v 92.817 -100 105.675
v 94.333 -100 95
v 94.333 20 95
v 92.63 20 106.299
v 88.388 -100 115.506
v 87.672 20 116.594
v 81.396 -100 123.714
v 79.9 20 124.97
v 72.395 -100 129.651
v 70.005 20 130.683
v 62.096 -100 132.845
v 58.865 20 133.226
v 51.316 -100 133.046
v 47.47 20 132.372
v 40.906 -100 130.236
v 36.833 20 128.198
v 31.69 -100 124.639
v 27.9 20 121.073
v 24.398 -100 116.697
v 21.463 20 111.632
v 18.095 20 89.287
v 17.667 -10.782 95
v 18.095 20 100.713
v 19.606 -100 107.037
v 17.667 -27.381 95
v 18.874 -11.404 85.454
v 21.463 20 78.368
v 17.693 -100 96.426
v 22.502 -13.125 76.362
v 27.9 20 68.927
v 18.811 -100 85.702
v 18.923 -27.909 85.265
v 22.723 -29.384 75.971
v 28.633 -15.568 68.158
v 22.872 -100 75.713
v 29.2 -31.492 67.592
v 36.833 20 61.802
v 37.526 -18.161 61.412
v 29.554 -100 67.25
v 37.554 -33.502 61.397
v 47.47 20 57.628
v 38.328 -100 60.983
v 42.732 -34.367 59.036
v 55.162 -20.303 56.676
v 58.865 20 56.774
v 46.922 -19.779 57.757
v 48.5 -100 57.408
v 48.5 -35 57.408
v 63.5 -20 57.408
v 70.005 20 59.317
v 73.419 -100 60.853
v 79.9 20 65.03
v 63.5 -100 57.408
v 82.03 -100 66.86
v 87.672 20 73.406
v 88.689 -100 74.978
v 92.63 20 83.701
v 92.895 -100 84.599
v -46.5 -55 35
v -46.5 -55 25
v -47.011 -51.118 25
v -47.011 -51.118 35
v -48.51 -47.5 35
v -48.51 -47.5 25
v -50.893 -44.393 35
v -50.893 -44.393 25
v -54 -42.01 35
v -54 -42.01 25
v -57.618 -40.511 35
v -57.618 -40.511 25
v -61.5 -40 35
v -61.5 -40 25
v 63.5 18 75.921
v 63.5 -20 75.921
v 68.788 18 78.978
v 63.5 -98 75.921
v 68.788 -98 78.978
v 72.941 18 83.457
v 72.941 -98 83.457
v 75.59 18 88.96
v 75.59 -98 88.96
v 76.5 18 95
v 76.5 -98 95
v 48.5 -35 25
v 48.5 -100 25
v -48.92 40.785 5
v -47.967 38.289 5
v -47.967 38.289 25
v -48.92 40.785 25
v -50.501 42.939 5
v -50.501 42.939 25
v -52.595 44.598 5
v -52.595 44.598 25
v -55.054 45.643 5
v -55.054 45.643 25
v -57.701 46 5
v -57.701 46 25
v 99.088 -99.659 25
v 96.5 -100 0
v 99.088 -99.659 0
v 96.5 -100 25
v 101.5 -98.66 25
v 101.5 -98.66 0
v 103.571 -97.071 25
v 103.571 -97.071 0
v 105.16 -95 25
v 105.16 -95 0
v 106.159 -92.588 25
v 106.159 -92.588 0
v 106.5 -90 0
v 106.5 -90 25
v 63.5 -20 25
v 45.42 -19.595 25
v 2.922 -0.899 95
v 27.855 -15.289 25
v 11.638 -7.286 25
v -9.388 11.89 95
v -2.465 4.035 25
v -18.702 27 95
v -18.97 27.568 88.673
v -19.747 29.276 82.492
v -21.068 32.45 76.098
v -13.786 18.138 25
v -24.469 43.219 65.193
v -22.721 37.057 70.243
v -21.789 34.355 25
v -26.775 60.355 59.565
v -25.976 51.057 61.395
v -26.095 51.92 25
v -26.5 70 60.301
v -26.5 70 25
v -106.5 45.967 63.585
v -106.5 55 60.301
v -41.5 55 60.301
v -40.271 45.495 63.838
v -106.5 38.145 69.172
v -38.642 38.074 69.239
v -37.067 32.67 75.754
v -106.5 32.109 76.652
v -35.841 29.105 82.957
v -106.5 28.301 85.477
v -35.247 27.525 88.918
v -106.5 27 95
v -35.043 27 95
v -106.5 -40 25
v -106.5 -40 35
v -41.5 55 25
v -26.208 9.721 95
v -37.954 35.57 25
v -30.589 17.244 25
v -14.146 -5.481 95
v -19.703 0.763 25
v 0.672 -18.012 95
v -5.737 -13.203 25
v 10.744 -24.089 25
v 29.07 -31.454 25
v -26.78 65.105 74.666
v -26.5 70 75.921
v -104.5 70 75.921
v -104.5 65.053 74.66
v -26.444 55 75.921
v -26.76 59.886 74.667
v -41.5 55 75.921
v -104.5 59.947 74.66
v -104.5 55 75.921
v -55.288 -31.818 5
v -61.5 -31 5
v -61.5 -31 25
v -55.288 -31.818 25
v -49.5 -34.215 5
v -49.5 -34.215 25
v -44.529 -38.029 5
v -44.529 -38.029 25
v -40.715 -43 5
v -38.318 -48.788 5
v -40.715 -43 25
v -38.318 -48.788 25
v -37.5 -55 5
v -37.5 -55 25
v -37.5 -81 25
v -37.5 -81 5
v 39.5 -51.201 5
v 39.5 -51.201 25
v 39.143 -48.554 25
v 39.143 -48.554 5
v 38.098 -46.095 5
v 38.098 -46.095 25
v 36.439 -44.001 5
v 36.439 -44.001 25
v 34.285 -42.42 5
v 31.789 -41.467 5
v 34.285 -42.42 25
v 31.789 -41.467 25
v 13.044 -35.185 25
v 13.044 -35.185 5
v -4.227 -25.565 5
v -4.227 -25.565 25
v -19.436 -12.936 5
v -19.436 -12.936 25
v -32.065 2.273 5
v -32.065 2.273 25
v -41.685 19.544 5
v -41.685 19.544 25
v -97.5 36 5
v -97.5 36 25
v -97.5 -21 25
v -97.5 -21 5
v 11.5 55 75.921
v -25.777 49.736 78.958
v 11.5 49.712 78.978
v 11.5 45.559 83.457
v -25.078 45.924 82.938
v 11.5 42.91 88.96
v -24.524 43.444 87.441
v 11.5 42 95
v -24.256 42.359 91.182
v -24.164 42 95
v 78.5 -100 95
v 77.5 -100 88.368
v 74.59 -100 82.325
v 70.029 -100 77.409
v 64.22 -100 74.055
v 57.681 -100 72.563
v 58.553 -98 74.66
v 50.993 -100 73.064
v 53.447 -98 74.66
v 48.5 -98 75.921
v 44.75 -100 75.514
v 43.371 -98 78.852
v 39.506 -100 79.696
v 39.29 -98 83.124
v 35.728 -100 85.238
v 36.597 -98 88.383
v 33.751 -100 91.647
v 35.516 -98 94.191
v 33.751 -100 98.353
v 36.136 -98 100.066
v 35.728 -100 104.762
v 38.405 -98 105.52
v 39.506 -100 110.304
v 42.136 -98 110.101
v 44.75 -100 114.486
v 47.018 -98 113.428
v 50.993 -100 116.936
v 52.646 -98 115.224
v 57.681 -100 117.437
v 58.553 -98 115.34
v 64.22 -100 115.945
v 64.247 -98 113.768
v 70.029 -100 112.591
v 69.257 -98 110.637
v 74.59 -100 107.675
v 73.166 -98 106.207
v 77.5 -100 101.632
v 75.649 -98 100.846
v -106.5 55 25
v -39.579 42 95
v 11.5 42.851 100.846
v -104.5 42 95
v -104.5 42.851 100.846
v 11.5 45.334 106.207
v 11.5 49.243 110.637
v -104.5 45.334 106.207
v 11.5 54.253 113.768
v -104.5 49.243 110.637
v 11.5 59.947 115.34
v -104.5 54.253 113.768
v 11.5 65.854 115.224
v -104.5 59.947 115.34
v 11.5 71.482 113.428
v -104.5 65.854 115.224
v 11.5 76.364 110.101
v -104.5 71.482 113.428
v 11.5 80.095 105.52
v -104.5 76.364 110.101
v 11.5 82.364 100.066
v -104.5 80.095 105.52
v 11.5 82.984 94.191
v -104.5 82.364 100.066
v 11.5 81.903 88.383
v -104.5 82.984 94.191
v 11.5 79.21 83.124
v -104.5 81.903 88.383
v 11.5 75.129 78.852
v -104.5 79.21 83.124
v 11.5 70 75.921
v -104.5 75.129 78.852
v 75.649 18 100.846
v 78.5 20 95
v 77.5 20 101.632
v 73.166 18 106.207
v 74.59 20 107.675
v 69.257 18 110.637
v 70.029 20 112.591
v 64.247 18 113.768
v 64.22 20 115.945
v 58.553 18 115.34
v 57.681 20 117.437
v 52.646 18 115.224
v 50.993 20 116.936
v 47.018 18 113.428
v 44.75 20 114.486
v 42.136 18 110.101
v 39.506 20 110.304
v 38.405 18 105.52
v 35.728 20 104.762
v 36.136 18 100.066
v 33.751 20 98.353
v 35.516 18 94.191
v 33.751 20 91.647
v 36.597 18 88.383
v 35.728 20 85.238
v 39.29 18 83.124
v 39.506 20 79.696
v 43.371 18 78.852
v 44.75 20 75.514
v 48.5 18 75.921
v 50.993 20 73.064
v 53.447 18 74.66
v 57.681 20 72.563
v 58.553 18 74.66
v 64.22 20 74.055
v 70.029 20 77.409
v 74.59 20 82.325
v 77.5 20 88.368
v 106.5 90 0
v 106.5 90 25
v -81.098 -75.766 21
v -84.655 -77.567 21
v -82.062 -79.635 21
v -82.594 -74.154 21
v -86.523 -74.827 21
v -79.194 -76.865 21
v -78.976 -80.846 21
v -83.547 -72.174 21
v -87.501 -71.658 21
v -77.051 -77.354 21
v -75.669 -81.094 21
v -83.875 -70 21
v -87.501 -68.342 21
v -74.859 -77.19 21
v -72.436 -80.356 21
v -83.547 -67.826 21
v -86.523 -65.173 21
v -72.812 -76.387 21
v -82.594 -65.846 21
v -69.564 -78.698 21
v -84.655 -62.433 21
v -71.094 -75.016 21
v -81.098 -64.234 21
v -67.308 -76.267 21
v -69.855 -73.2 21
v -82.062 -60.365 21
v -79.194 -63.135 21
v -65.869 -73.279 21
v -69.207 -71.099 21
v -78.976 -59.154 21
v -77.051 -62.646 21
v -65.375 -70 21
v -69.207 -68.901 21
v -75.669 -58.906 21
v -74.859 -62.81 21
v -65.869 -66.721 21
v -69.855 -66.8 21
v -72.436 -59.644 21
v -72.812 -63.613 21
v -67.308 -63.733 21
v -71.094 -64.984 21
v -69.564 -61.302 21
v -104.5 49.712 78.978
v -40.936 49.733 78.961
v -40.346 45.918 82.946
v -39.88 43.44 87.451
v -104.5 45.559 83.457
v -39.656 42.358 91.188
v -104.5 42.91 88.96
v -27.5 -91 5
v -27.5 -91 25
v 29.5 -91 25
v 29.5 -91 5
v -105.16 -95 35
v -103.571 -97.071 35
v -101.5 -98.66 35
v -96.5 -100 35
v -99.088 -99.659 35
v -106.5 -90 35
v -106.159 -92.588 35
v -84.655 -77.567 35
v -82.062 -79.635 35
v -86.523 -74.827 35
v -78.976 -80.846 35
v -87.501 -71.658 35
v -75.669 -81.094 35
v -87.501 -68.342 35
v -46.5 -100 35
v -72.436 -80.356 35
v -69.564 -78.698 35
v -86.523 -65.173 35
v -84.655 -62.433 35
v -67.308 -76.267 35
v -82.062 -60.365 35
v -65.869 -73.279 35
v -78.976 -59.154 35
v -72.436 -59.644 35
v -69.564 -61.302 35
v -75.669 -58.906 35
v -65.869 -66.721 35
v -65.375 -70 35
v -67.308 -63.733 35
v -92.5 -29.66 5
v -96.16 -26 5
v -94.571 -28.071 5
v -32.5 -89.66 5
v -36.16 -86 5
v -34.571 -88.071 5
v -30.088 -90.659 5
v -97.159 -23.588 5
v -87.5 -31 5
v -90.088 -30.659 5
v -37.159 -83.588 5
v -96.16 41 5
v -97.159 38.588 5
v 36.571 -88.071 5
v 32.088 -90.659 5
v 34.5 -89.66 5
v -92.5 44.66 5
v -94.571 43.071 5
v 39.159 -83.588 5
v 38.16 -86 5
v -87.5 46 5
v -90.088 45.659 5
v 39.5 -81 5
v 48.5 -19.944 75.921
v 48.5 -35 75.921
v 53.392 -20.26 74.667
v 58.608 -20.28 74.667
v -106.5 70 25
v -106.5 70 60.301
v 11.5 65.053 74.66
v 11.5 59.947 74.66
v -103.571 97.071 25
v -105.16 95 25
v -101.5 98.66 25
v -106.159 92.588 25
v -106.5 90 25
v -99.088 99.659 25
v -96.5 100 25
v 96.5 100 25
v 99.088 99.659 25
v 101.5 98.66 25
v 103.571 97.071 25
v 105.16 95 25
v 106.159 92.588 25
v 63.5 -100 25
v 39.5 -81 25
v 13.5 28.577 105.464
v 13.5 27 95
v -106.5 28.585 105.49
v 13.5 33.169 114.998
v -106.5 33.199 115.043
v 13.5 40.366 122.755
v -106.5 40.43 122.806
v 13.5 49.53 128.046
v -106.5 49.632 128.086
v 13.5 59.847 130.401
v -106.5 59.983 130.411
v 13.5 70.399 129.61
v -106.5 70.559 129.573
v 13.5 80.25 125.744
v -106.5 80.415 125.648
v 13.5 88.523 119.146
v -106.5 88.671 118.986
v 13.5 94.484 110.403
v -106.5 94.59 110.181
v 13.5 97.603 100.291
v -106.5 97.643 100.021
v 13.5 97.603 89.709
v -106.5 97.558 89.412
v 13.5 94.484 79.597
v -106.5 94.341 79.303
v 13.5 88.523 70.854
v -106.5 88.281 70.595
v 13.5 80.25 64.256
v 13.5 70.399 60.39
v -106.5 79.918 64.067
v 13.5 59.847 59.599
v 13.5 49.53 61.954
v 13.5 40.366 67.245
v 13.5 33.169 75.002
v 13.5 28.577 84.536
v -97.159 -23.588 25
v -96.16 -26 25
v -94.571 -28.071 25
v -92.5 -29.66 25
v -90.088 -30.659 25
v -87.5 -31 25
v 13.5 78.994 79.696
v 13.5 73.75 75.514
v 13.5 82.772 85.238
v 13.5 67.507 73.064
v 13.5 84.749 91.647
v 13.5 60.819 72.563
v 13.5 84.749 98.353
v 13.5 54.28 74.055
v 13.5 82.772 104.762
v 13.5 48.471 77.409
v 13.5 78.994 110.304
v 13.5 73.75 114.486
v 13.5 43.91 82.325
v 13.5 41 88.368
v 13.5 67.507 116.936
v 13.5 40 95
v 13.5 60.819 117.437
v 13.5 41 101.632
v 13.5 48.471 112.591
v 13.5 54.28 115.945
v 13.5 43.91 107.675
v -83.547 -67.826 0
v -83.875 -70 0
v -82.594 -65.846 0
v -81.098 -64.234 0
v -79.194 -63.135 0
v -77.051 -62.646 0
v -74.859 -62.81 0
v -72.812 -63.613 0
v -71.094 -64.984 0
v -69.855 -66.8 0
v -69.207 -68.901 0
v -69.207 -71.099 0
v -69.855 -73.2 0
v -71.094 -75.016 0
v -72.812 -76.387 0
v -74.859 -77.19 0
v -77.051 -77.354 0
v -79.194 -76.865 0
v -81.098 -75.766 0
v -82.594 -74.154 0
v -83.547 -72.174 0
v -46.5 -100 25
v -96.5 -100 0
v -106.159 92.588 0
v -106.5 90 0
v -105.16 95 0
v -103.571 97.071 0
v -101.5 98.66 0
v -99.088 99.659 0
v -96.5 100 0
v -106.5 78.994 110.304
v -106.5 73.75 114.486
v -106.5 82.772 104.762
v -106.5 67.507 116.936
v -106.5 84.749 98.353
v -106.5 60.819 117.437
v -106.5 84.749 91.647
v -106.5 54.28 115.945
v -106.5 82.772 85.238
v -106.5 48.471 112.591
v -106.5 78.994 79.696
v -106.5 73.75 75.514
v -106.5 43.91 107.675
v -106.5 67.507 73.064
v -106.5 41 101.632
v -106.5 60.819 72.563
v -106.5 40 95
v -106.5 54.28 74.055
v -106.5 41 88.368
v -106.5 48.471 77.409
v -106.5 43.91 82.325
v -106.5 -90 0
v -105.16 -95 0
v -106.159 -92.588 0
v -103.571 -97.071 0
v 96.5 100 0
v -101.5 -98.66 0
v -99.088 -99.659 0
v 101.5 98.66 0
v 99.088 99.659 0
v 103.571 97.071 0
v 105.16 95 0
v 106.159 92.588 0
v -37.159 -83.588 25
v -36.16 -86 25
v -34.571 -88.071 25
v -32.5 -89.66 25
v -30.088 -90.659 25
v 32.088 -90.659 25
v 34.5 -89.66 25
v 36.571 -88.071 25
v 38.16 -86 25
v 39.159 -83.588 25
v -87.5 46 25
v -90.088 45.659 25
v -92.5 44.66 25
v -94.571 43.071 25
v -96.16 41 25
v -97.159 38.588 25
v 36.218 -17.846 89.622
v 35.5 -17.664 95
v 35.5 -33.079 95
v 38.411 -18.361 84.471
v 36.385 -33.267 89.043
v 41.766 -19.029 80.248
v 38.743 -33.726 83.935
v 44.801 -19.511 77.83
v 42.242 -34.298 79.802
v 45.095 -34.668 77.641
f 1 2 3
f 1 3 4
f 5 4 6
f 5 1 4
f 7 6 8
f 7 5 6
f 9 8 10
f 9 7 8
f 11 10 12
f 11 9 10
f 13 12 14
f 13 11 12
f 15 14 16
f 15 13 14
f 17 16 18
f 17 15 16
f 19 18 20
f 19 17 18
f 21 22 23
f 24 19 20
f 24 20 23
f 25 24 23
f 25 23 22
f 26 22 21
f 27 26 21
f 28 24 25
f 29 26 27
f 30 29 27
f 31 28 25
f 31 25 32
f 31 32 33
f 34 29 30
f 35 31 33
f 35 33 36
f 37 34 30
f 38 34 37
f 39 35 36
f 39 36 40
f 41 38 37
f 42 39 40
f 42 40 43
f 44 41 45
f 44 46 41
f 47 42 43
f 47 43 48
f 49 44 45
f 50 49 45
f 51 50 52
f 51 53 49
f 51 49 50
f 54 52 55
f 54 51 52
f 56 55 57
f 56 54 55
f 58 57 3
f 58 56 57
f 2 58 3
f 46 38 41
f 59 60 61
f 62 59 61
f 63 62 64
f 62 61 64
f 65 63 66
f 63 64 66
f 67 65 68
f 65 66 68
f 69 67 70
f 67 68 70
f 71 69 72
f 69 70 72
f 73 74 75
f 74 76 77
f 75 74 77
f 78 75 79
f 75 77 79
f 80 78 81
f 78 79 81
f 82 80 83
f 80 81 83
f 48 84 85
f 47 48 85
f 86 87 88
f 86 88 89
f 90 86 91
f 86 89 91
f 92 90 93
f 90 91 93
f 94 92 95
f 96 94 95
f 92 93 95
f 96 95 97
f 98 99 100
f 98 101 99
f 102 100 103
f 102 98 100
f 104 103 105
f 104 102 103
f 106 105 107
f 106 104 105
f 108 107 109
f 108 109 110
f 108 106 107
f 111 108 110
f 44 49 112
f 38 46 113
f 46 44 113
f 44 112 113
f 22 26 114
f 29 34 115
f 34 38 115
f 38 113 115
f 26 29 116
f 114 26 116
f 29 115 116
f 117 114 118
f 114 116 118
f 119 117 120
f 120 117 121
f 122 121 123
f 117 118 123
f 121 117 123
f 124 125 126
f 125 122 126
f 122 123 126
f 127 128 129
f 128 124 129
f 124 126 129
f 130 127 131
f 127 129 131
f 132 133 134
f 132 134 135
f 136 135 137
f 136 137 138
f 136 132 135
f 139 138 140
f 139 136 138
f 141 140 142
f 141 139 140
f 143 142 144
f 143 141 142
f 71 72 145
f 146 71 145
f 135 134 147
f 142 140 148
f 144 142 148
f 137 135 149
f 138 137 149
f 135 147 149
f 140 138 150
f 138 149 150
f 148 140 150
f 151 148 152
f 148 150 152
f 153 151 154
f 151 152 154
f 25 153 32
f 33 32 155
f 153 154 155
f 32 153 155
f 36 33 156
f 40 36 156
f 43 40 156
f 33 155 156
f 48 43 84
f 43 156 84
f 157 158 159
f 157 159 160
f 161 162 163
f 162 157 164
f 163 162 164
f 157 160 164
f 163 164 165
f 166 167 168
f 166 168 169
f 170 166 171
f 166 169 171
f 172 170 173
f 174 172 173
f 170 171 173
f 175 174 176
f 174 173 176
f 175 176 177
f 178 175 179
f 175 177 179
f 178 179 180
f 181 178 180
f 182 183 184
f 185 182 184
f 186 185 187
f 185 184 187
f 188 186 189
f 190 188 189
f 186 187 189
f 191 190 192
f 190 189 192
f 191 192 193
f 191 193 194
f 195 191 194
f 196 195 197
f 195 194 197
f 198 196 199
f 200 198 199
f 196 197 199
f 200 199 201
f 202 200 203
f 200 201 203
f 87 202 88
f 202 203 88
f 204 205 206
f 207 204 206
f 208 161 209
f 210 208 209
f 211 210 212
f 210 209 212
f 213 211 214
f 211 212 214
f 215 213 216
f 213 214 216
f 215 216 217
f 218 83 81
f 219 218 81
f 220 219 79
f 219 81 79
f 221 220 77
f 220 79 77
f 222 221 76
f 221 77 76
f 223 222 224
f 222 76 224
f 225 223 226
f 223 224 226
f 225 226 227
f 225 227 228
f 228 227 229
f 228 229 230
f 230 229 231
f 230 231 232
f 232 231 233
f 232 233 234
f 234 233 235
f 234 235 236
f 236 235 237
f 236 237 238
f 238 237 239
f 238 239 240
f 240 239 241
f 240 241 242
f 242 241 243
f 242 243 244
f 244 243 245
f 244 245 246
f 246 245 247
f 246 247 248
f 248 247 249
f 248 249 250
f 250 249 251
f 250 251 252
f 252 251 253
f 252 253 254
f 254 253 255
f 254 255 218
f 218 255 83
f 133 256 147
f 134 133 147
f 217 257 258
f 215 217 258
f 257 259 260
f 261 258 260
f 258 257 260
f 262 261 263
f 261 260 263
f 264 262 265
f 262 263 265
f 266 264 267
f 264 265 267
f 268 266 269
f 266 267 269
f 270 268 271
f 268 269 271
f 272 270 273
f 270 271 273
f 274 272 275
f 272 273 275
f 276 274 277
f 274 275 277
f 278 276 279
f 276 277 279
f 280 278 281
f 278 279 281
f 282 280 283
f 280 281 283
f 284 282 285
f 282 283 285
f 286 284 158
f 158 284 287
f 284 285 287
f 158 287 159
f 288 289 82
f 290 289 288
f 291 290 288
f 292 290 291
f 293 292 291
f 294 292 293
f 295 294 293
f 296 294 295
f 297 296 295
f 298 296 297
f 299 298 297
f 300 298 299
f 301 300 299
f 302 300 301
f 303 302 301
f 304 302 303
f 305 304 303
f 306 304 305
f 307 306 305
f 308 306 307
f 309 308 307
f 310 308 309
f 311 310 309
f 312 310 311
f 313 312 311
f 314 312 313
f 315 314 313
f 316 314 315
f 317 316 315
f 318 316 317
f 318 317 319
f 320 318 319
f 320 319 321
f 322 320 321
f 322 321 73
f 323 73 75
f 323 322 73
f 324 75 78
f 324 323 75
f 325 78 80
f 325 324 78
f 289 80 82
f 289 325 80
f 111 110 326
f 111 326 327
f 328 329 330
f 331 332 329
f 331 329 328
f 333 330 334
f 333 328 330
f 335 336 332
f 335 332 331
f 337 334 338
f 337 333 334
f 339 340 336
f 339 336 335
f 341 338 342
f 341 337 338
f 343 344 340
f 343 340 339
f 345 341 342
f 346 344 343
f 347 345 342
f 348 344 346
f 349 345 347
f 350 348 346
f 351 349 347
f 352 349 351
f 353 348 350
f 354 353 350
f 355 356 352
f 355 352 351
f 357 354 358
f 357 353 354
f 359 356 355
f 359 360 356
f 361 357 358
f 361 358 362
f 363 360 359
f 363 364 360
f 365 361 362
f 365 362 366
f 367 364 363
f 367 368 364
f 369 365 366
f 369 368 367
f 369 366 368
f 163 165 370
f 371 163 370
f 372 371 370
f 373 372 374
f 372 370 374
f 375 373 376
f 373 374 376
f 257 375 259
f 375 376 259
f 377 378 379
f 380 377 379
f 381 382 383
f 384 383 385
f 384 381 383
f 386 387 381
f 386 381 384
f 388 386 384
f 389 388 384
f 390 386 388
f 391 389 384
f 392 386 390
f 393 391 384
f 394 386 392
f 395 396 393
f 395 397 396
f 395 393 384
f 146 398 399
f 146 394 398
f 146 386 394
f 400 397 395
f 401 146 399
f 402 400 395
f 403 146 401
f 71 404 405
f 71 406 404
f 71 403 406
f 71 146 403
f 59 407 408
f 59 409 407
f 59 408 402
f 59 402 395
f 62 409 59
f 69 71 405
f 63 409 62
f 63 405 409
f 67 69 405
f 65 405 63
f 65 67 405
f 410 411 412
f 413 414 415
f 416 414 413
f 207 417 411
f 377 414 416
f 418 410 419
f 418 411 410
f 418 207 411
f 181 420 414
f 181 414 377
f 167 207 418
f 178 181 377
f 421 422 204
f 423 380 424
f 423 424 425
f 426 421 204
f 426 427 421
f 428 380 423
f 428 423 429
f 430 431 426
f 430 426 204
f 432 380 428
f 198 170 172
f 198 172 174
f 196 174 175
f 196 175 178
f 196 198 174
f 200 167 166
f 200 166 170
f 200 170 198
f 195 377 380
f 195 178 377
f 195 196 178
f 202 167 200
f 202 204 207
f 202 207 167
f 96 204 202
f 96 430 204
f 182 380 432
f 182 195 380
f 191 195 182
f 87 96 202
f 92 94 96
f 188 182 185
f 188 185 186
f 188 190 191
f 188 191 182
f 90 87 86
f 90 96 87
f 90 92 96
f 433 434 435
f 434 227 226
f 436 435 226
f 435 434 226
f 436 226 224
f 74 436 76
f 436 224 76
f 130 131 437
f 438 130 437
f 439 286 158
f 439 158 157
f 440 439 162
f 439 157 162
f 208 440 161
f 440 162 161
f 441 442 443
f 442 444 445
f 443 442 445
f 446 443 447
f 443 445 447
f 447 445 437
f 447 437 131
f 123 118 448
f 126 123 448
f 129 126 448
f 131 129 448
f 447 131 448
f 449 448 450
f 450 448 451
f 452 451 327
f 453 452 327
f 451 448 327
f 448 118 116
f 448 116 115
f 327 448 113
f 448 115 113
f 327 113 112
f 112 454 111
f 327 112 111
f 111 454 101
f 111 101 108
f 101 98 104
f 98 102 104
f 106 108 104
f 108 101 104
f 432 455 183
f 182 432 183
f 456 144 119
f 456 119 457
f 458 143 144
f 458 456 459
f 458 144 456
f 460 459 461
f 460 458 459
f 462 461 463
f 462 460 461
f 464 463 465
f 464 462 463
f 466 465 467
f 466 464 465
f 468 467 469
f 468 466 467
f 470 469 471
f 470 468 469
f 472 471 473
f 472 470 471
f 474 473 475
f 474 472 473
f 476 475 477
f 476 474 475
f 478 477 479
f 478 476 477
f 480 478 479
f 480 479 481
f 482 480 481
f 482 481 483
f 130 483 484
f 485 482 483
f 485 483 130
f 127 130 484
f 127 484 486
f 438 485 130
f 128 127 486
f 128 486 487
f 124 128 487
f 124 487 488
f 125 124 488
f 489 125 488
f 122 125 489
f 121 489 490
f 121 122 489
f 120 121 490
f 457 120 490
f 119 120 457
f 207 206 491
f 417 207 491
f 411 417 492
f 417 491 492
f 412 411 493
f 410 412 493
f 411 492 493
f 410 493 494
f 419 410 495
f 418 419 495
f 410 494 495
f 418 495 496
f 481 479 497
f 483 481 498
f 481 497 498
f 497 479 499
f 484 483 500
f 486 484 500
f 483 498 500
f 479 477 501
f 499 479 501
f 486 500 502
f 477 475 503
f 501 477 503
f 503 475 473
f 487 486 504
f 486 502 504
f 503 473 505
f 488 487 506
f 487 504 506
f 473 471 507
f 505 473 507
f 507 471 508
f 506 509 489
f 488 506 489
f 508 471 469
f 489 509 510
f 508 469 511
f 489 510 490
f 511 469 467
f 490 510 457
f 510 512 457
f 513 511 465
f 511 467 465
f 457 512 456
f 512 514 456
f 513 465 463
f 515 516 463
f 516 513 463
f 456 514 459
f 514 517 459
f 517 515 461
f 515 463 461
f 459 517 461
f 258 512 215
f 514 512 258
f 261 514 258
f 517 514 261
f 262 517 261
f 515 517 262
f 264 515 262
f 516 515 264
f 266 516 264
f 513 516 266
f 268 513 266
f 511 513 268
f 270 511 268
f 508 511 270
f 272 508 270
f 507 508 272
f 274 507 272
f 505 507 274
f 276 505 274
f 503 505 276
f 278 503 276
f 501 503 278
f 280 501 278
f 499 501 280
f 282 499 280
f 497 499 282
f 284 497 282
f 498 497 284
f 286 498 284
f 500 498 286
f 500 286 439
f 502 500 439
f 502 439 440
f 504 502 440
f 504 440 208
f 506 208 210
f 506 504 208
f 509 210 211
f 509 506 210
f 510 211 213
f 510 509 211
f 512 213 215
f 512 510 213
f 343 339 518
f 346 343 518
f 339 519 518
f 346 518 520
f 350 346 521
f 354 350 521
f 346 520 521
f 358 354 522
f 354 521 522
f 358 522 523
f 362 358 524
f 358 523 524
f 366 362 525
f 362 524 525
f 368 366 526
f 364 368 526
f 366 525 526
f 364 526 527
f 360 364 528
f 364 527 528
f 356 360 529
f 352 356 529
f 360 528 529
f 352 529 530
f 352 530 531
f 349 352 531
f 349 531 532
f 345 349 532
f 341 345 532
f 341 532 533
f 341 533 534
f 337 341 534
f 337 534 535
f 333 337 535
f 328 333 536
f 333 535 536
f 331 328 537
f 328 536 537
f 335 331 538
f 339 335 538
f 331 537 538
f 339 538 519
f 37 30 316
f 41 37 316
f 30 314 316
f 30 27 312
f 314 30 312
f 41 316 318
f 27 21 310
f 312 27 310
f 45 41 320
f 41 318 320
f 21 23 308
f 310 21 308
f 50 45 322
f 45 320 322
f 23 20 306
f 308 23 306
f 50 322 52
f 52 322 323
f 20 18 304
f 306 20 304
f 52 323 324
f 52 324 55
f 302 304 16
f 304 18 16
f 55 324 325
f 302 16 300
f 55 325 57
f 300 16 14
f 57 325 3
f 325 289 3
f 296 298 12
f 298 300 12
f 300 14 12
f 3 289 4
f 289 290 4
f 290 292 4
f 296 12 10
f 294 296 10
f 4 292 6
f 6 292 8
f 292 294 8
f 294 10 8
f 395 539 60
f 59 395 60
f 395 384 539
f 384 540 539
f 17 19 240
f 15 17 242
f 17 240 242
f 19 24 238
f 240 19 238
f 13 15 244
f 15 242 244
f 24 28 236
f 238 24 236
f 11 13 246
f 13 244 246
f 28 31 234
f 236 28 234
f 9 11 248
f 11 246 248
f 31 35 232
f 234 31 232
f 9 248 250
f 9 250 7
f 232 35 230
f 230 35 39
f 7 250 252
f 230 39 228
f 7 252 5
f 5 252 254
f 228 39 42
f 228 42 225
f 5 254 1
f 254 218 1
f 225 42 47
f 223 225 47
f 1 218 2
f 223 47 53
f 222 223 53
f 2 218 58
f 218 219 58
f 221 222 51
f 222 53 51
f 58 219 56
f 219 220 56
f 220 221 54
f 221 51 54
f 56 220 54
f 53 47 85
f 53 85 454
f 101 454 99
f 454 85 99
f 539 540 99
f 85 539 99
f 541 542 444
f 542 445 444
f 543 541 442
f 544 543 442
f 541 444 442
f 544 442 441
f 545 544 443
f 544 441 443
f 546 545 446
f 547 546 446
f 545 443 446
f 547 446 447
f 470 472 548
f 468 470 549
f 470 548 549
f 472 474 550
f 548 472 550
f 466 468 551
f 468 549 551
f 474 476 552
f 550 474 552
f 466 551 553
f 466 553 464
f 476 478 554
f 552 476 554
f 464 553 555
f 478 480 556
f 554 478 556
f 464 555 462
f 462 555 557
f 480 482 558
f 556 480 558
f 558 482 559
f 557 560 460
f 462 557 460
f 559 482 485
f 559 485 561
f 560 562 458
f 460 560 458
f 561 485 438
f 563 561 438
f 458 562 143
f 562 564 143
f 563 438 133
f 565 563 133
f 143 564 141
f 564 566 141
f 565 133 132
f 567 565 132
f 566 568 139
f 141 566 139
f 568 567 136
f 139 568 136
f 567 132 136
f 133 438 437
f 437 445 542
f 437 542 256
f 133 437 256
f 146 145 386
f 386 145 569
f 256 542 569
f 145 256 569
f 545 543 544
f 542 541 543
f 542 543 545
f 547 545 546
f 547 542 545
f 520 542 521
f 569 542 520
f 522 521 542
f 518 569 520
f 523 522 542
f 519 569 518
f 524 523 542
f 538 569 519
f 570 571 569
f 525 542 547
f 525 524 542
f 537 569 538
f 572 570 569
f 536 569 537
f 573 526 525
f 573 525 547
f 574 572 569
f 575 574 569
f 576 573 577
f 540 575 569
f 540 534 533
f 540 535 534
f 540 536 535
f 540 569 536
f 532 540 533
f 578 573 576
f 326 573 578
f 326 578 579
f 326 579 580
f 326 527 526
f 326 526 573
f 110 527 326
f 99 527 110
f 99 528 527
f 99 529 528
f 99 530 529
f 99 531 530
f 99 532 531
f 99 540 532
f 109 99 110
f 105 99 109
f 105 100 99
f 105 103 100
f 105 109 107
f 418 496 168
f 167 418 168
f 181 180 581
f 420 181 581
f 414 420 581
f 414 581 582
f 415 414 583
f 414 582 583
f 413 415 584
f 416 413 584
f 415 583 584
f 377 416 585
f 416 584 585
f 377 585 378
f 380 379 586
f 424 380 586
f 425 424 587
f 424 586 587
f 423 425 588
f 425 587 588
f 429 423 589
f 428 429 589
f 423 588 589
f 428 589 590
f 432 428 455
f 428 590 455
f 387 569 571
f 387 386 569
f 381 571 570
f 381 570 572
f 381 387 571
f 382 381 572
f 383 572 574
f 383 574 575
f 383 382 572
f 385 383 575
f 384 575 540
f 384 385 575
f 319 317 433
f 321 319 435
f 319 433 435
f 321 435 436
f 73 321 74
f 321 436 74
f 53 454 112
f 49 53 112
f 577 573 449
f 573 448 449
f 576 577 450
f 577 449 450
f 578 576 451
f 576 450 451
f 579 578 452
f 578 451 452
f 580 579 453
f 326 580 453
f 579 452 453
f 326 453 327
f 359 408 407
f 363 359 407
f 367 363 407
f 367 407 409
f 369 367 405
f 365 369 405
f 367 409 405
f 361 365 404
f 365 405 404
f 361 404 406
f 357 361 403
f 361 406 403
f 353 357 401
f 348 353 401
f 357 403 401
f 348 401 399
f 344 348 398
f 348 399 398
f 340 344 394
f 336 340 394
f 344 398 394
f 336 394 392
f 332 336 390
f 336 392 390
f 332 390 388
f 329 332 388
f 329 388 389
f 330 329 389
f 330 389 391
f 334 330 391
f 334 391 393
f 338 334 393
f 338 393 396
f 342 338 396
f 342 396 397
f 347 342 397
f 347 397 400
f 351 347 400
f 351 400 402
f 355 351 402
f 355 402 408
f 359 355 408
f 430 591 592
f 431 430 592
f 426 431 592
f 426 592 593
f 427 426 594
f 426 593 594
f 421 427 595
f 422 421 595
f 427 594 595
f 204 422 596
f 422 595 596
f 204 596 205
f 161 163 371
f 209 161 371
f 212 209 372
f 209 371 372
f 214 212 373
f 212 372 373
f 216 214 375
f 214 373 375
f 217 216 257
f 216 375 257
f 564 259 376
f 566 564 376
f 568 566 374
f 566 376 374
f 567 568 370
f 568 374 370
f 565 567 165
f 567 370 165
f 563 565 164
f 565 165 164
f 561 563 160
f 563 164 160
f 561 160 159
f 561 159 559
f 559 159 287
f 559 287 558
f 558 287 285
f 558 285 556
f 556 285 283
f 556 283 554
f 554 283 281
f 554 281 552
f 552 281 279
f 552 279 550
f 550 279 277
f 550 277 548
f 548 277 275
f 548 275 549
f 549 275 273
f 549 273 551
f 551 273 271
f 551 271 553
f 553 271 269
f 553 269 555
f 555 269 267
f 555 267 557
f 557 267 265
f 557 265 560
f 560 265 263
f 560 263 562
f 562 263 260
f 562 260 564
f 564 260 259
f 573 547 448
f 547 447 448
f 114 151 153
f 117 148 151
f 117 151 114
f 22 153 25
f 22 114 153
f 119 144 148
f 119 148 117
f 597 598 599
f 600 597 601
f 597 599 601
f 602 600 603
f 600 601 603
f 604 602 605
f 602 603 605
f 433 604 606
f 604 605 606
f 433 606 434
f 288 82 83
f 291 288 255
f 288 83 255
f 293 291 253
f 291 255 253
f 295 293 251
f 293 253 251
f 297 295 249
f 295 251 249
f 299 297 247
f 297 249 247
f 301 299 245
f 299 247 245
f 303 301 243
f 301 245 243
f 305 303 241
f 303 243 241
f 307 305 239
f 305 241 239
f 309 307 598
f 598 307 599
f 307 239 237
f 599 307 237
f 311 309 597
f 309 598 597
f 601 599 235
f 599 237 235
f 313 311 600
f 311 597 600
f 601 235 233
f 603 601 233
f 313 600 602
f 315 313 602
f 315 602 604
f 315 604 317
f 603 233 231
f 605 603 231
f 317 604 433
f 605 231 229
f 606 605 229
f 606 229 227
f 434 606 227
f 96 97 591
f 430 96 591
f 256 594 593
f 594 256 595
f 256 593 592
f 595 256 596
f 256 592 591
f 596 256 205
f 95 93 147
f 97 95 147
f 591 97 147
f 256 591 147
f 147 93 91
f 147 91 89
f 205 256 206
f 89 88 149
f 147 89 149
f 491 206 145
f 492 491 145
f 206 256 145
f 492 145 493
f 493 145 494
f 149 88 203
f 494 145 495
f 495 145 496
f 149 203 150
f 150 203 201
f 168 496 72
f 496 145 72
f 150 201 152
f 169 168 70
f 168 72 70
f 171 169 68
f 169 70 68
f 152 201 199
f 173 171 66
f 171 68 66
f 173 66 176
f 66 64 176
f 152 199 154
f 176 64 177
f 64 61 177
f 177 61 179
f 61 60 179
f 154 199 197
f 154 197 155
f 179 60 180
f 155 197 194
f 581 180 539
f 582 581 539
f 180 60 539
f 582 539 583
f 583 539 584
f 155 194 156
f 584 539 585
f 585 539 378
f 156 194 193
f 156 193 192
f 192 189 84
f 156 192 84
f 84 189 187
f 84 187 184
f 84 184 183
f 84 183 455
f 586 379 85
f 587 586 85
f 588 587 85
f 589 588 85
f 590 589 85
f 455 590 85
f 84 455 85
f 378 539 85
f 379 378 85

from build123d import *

# Parameters (mm, degrees)
F0_W            = 213
F0_H            = 25
F1_DEPTH        = 100
F3_DEPTH        = 20
F4_DEPTH        = 70
F5_R            = 38.333333335
F5_R_2          = 20.5
F6_DEPTH        = 120
F7_R            = 35.5
F7_R_2          = 20.5
F8_DEPTH        = 120
F9_DEPTH        = 213.001
F10_DEPTH       = 200.001
F11_DEPTH       = 10
F13_D           = 14.75
F13_CBORE_D     = 22.25
F13_CBORE_DEPTH = 14
F14_R           = 10


# Not quite as in the source:
# - a fillet or chamfer that OpenCascade refuses, or shapes differently, is made with other operations: its cross-section is extruded or revolved along the edge and cut away or added


with BuildPart() as f1:
    # F0 (on Front) → F1 (new body, symmetric)
    with BuildSketch(Plane.XZ):
        with Locations((0, 12.5)):
            Rectangle(F0_W, F0_H)
    extrude(amount=F1_DEPTH, both=True)

    # F2 (on face) → F3 (cut)
    with BuildSketch(Plane.XY.offset(25)):
        with BuildLine():
            ThreePointArc((-97.5, -21), (-94.5710678119, -28.0710678119), (-87.5, -31))
            Line((-87.5, -31), (-61.5, -31))
            ThreePointArc((-61.5, -31), (-44.5294372515, -38.0294372515), (-37.5, -55))
            Line((-37.5, -55), (-37.5, -81))
            ThreePointArc((-37.5, -81), (-34.5710678119, -88.0710678119), (-27.5, -91))
            Line((-27.5, -91), (29.5, -91))
            ThreePointArc((29.5, -91), (36.5710678119, -88.0710678119), (39.5, -81))
            Line((39.5, -81), (39.5, -51.2013330404))
            ThreePointArc((39.5, -51.2013330404), (37.338740663, -44.9921346366), (31.7891710363, -41.4668738378))
            ThreePointArc((31.7891710363, -41.4668738378), (-19.4358675785, -12.9358675785), (-47.9668738378, 38.2891710363))
            ThreePointArc((-47.9668738378, 38.2891710363), (-51.4921346366, 43.838740663), (-57.7013330404, 46))
            Line((-57.7013330404, 46), (-87.5, 46))
            ThreePointArc((-87.5, 46), (-94.5710678119, 43.0710678119), (-97.5, 36))
            Line((-97.5, 36), (-97.5, -21))
        make_face()
    extrude(amount=-F3_DEPTH, mode=Mode.SUBTRACT)

    # F2 (on face) → F4 (join)
    with BuildSketch(Plane.XY.offset(25)):
        with BuildLine():
            Line((-26.5, 70), (-106.5, 70))
            Line((-106.5, 70), (-106.5, 55))
            Line((-106.5, 55), (-41.5, 55))
            ThreePointArc((-41.5, 55), (-13.0719065478, -6.5719065478), (48.5, -35))
            Line((48.5, -35), (48.5, -100))
            Line((48.5, -100), (63.5, -100))
            Line((63.5, -100), (63.5, -20))
            ThreePointArc((63.5, -20), (-2.46530483, 4.03469517), (-26.5, 70))
        make_face()
    extrude(amount=F4_DEPTH)

    # F5 (on face) → F6 (join)
    with BuildSketch(Plane.XZ.offset(100)):
        with Locations((56, 95)):
            Circle(F5_R)
        with Locations((56, 95)):
            Circle(F5_R_2, mode=Mode.SUBTRACT)
    extrude(amount=-F6_DEPTH)

    # F7 (on face) → F8 (join)
    with BuildSketch(Plane(origin=(-106.5, 0, 0), x_dir=(0, -1, 0), z_dir=(-1, 0, 0))):
        with Locations((-62.5, 95)):
            Circle(F7_R)
        with Locations((-62.5, 95)):
            Circle(F7_R_2, mode=Mode.SUBTRACT)
    extrude(amount=-F8_DEPTH)

    # F7 (on face) → F9 (cut, through all)
    with BuildSketch(Plane(origin=(-106.5, 0, 0), x_dir=(0, -1, 0), z_dir=(-1, 0, 0))):
        with BuildLine():
            ThreePointArc((-42, 95), (-74.0433963806, 111.9410743461), (-70, 75.9212159717))
            Line((-70, 75.9212159717), (-70, 95))
            Line((-70, 95), (-55, 95))
            Line((-55, 95), (-55, 75.9212159717))
            ThreePointArc((-55, 75.9212159717), (-45.5589256539, 83.4566036194), (-42, 95))
        make_face()
        with BuildLine():
            Line((-70, 95), (-70, 75.9212159717))
            ThreePointArc((-70, 75.9212159717), (-62.5, 74.5), (-55, 75.9212159717))
            Line((-55, 75.9212159717), (-55, 95))
            Line((-55, 95), (-70, 95))
        make_face()
    extrude(amount=-F9_DEPTH, mode=Mode.SUBTRACT)

    # F5 (on face) → F10 (cut, through all)
    with BuildSketch(Plane.XZ.offset(100)):
        with BuildLine():
            ThreePointArc((76.5, 95), (44.4566036194, 111.9410743461), (48.5, 75.9212159717))
            Line((48.5, 75.9212159717), (48.5, 95))
            Line((48.5, 95), (63.5, 95))
            Line((63.5, 95), (63.5, 75.9212159717))
            ThreePointArc((63.5, 75.9212159717), (72.9410743461, 83.4566036194), (76.5, 95))
        make_face()
        with BuildLine():
            Line((48.5, 95), (48.5, 75.9212159717))
            ThreePointArc((48.5, 75.9212159717), (56, 74.5), (63.5, 75.9212159717))
            Line((63.5, 75.9212159717), (63.5, 95))
            Line((63.5, 95), (48.5, 95))
        make_face()
    extrude(amount=-F10_DEPTH, mode=Mode.SUBTRACT)

    # F2 (on face) → F11 (join)
    with BuildSketch(Plane.XY.offset(25)):
        with BuildLine():
            Line((-61.5, -40), (-106.5, -40))
            Line((-106.5, -40), (-106.5, -100))
            Line((-106.5, -100), (-46.5, -100))
            Line((-46.5, -100), (-46.5, -55))
            ThreePointArc((-46.5, -55), (-50.8933982822, -44.3933982822), (-61.5, -40))
        make_face()
    extrude(amount=F11_DEPTH)

    # F13 (through all)
    with Locations(Plane.XY.offset(35)):
        with Locations((-76.5, -70)):
            CounterBoreHole(F13_D / 2, F13_CBORE_D / 2, F13_CBORE_DEPTH)

    # F14
    f14_edges = [f1.edges().sort_by_distance(p)[0] for p in [
        (106.5, -100, 12.5),
        (106.5, 100, 12.5),
        (-106.5, 100, 12.5),
        (-106.5, -100, 17.5),
    ]]
    fillet(f14_edges, radius=F14_R)

    # F15: chamfer of 2 on 4 edges, made by hand

    # F15_s1 → F15_t2 (revolve, cut)
    with BuildSketch(Plane.XY.offset(95)):
        Polygon((78.5, -100), (76.5, -98), (76.5, -100), align=None)
    revolve(axis=Axis((56, -100, 95), (0, 1, 0)), mode=Mode.SUBTRACT)

    # F15_s3 → F15_t4 (revolve, cut)
    with BuildSketch(Plane.XY.offset(95)):
        Polygon((-106.5, 40), (-104.5, 42), (-106.5, 42), align=None)
    revolve(axis=Axis((-106.5, 62.5, 95), (1, 0, 0)), mode=Mode.SUBTRACT)

    # F15_s5 → F15_t6 (revolve, cut)
    with BuildSketch(Plane.XY.offset(95)):
        Polygon((11.5, 42), (13.5, 40), (13.5, 42), align=None)
    revolve(axis=Axis((13.5, 62.5, 95), (-1, 0, 0)), mode=Mode.SUBTRACT)

    # F15_s7 → F15_t8 (revolve, cut)
    with BuildSketch(Plane.XY.offset(95)):
        Polygon((76.5, 18), (78.5, 20), (76.5, 20), align=None)
    revolve(axis=Axis((56, 20, 95), (0, -1, 0)), mode=Mode.SUBTRACT)


solid = f1.part
